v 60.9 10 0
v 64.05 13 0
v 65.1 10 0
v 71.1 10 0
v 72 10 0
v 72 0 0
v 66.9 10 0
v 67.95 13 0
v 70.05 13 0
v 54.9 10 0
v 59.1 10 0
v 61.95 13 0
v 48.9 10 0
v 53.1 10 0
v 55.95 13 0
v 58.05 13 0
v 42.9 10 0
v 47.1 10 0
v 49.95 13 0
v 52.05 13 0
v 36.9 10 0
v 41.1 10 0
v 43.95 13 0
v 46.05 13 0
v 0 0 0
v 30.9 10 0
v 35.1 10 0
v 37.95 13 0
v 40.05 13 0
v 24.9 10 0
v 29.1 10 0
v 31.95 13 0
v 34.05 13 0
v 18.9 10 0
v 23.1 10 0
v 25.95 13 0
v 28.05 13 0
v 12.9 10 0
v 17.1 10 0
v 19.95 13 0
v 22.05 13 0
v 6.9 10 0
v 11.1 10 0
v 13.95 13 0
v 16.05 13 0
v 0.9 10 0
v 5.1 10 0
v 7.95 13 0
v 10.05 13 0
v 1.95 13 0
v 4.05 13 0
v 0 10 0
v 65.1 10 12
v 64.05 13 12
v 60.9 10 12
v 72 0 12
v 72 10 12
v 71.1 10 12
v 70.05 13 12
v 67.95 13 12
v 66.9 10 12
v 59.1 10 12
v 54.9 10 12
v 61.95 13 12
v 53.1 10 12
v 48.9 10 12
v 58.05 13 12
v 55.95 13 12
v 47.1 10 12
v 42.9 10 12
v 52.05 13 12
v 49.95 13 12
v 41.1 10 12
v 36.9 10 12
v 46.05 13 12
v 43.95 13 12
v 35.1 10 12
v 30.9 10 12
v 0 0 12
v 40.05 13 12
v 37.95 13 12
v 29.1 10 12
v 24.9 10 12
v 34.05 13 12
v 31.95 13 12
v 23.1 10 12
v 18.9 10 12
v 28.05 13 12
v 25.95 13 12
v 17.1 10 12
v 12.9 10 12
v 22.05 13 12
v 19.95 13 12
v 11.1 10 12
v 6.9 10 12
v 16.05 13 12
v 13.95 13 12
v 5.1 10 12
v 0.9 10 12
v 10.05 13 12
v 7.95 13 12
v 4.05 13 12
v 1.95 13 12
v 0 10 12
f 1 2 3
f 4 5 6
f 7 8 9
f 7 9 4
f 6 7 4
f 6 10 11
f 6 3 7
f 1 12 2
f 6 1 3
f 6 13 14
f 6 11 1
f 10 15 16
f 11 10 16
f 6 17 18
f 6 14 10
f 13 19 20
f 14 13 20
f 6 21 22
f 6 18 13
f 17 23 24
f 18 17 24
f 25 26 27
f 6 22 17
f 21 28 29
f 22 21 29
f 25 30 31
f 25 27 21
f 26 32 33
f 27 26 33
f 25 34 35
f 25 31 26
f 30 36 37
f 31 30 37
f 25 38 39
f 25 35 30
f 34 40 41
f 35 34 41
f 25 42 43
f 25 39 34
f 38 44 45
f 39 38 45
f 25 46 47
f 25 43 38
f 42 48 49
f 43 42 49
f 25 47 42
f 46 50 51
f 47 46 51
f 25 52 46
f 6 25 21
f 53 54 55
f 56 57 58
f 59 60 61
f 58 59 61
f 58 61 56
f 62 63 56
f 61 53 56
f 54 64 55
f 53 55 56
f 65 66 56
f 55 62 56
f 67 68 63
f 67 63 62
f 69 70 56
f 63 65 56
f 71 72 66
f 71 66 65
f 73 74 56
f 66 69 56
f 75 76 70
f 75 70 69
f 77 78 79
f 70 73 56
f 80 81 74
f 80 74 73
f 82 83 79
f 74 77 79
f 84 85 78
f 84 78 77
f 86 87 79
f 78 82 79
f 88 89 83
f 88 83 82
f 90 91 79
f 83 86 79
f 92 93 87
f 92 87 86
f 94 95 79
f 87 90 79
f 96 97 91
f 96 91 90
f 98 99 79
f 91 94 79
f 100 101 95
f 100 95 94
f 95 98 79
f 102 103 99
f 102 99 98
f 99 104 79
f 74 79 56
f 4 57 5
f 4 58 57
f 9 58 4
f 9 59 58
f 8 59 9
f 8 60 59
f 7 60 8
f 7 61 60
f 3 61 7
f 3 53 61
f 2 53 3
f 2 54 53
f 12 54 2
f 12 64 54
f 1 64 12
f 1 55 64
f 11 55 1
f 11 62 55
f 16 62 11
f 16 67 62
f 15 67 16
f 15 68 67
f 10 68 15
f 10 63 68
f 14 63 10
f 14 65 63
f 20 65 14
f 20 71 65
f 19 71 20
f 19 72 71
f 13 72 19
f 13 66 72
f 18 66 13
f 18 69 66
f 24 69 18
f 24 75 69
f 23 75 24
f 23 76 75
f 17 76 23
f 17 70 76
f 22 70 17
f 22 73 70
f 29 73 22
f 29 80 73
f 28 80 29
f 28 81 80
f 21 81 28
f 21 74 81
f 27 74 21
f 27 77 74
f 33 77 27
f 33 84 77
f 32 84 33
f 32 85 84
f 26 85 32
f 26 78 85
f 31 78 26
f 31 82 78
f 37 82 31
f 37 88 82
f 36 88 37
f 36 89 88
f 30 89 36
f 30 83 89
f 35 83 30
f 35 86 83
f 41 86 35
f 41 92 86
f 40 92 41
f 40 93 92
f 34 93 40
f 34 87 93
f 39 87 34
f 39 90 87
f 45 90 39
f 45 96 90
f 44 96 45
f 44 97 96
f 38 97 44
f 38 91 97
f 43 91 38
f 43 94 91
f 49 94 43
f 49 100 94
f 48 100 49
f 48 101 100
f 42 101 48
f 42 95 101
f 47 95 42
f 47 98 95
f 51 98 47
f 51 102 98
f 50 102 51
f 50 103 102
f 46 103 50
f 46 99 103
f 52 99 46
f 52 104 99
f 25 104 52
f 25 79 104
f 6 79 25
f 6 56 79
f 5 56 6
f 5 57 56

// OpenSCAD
$fn = 32;

// ----------------------------------------------------------------------
// Gear rack: 12 teeth, pitch 6 mm
// ----------------------------------------------------------------------

// --- parameters (mm) ---
teeth = 12;               // number of teeth
pitch = 6;                // tooth pitch, X
root_w = 4.2;             // tooth width at the root
tip_w = 2.1;              // tooth width at the tip
base_h = 10;              // rack body height, Y
tooth_h = 3;              // tooth height above the body
plate_t = 12;             // rack width, Z (extrusion height)
fit_tol = 0.02;           // declared fit tolerance (prompt contract)
free_tol = 0.2;           // declared free tolerance (prompt contract)

rack_l = teeth * pitch;  // overall length
total_h = base_h + tooth_h;  // overall height

profile = [[0, 0], [72, 0], [72, 10], [71.1, 10], [70.05, 13], [67.95, 13], [66.9, 10], [65.1, 10], [64.05, 13], [61.95, 13], [60.9, 10], [59.1, 10], [58.05, 13], [55.95, 13], [54.9, 10], [53.1, 10], [52.05, 13], [49.95, 13], [48.9, 10], [47.1, 10], [46.05, 13], [43.95, 13], [42.9, 10], [41.1, 10], [40.05, 13], [37.95, 13], [36.9, 10], [35.1, 10], [34.05, 13], [31.95, 13], [30.9, 10], [29.1, 10], [28.05, 13], [25.95, 13], [24.9, 10], [23.1, 10], [22.05, 13], [19.95, 13], [18.9, 10], [17.1, 10], [16.05, 13], [13.95, 13], [12.9, 10], [11.1, 10], [10.05, 13], [7.95, 13], [6.9, 10], [5.1, 10], [4.05, 13], [1.95, 13], [0.9, 10], [0, 10]];  // primary outline, 52 points, counter clockwise

// --- the one profile operation ---
linear_extrude(height = plate_t) polygon(points = profile);
